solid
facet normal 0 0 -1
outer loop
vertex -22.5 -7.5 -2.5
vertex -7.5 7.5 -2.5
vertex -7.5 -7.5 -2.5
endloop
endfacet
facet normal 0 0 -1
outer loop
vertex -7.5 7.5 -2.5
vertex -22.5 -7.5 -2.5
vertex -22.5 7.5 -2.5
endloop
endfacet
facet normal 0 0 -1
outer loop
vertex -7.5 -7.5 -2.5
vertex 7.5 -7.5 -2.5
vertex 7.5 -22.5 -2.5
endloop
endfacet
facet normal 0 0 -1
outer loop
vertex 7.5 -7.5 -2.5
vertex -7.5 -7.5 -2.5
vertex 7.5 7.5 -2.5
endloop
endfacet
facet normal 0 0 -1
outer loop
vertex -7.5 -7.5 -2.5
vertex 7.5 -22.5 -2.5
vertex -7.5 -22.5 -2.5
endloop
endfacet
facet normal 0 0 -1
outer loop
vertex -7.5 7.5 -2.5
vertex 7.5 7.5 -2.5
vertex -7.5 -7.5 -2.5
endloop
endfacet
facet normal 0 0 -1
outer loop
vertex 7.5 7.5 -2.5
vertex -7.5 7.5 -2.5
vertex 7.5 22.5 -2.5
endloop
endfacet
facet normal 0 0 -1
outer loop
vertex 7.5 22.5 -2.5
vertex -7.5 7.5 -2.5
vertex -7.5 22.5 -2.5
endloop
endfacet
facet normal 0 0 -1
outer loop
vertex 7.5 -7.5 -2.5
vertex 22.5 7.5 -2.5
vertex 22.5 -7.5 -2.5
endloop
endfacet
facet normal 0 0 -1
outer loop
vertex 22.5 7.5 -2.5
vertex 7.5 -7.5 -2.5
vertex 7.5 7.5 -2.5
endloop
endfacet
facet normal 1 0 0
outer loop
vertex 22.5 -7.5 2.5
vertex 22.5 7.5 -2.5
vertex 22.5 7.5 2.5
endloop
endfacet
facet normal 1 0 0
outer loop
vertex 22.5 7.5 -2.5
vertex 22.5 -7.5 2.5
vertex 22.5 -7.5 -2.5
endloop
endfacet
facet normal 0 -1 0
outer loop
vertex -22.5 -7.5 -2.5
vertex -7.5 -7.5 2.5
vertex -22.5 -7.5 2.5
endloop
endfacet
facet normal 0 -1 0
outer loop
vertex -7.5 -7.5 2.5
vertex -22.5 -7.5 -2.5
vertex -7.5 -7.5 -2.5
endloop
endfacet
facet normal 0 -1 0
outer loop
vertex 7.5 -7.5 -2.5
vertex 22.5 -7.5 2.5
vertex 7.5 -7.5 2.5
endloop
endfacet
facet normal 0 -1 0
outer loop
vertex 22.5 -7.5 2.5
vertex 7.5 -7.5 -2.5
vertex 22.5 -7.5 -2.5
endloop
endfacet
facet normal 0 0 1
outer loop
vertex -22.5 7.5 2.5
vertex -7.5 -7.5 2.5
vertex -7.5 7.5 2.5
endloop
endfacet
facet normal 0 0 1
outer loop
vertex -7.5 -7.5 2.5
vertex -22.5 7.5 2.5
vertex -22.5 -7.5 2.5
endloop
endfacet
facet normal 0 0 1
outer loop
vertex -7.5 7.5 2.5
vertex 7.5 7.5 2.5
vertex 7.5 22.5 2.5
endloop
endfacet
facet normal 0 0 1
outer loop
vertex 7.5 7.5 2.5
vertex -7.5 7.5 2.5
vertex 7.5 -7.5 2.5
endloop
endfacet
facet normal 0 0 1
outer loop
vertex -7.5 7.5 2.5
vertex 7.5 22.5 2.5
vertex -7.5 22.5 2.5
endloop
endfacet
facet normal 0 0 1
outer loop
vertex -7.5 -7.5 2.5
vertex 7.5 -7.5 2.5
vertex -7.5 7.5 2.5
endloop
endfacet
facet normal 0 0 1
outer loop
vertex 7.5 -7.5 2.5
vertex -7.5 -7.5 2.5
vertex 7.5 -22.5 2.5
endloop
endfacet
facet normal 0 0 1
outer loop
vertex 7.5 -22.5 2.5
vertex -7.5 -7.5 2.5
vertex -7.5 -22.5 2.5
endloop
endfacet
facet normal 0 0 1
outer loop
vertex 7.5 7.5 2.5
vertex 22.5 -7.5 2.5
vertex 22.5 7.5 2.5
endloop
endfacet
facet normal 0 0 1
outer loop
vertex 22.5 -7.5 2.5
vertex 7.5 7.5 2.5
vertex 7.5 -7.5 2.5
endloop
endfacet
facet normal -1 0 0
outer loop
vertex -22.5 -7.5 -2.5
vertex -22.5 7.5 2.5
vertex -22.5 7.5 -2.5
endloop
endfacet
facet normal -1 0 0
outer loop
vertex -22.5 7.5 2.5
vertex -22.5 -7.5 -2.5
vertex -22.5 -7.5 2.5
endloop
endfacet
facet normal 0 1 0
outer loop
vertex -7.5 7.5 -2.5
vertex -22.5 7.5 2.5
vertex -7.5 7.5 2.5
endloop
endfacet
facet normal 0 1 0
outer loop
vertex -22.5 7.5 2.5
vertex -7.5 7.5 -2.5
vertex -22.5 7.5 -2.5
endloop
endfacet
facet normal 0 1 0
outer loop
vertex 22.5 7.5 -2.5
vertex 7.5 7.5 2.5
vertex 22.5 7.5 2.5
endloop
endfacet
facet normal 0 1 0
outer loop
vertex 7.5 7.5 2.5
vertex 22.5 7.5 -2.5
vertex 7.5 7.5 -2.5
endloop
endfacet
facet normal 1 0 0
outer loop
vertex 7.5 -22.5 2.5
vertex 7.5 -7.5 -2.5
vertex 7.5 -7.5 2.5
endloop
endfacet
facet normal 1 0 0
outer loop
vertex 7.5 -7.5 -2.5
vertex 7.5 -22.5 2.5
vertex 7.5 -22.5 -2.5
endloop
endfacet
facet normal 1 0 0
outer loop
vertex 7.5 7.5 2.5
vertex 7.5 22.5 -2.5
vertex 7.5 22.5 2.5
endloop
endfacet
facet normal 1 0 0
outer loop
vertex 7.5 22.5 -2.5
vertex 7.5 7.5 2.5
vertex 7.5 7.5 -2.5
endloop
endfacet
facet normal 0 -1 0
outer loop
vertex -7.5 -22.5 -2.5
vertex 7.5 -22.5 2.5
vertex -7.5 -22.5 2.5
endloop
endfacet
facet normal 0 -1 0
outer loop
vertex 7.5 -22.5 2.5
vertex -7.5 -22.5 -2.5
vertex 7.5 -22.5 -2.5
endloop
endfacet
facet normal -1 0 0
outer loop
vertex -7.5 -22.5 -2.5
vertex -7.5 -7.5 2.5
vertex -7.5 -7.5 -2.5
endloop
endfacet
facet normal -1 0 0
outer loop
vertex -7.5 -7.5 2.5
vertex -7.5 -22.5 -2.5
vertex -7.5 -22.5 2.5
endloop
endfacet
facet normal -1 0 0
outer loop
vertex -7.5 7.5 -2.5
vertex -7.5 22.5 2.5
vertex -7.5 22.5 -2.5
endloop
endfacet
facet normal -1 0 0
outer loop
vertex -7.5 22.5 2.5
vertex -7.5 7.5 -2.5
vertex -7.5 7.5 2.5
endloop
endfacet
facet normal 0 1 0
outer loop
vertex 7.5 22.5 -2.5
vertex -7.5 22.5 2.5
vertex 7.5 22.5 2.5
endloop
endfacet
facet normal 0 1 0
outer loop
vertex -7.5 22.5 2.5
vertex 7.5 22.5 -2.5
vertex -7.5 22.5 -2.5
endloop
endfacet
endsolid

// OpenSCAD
union()
{
    linear_extrude(height = 5.0, twist = 0.0, scale = 1.0, slices = 1, center = true)
    {
        scale([45.0, 15.0])
        {
            M52();
        }
    }
    linear_extrude(height = 5.0, twist = 0.0, scale = 1.0, slices = 1, center = true)
    {
        scale([15.0, 45.0])
        {
            M52();
        }
    }
}

module M52()
{
    polygon
    (
        points =
        [
            [-0.5, -0.5], 
            [0.5, -0.5], 
            [0.5, 0.5], 
            [-0.5, 0.5]
        ],
        paths =
        [
            [0, 1, 2, 3]
        ]
    );
}
